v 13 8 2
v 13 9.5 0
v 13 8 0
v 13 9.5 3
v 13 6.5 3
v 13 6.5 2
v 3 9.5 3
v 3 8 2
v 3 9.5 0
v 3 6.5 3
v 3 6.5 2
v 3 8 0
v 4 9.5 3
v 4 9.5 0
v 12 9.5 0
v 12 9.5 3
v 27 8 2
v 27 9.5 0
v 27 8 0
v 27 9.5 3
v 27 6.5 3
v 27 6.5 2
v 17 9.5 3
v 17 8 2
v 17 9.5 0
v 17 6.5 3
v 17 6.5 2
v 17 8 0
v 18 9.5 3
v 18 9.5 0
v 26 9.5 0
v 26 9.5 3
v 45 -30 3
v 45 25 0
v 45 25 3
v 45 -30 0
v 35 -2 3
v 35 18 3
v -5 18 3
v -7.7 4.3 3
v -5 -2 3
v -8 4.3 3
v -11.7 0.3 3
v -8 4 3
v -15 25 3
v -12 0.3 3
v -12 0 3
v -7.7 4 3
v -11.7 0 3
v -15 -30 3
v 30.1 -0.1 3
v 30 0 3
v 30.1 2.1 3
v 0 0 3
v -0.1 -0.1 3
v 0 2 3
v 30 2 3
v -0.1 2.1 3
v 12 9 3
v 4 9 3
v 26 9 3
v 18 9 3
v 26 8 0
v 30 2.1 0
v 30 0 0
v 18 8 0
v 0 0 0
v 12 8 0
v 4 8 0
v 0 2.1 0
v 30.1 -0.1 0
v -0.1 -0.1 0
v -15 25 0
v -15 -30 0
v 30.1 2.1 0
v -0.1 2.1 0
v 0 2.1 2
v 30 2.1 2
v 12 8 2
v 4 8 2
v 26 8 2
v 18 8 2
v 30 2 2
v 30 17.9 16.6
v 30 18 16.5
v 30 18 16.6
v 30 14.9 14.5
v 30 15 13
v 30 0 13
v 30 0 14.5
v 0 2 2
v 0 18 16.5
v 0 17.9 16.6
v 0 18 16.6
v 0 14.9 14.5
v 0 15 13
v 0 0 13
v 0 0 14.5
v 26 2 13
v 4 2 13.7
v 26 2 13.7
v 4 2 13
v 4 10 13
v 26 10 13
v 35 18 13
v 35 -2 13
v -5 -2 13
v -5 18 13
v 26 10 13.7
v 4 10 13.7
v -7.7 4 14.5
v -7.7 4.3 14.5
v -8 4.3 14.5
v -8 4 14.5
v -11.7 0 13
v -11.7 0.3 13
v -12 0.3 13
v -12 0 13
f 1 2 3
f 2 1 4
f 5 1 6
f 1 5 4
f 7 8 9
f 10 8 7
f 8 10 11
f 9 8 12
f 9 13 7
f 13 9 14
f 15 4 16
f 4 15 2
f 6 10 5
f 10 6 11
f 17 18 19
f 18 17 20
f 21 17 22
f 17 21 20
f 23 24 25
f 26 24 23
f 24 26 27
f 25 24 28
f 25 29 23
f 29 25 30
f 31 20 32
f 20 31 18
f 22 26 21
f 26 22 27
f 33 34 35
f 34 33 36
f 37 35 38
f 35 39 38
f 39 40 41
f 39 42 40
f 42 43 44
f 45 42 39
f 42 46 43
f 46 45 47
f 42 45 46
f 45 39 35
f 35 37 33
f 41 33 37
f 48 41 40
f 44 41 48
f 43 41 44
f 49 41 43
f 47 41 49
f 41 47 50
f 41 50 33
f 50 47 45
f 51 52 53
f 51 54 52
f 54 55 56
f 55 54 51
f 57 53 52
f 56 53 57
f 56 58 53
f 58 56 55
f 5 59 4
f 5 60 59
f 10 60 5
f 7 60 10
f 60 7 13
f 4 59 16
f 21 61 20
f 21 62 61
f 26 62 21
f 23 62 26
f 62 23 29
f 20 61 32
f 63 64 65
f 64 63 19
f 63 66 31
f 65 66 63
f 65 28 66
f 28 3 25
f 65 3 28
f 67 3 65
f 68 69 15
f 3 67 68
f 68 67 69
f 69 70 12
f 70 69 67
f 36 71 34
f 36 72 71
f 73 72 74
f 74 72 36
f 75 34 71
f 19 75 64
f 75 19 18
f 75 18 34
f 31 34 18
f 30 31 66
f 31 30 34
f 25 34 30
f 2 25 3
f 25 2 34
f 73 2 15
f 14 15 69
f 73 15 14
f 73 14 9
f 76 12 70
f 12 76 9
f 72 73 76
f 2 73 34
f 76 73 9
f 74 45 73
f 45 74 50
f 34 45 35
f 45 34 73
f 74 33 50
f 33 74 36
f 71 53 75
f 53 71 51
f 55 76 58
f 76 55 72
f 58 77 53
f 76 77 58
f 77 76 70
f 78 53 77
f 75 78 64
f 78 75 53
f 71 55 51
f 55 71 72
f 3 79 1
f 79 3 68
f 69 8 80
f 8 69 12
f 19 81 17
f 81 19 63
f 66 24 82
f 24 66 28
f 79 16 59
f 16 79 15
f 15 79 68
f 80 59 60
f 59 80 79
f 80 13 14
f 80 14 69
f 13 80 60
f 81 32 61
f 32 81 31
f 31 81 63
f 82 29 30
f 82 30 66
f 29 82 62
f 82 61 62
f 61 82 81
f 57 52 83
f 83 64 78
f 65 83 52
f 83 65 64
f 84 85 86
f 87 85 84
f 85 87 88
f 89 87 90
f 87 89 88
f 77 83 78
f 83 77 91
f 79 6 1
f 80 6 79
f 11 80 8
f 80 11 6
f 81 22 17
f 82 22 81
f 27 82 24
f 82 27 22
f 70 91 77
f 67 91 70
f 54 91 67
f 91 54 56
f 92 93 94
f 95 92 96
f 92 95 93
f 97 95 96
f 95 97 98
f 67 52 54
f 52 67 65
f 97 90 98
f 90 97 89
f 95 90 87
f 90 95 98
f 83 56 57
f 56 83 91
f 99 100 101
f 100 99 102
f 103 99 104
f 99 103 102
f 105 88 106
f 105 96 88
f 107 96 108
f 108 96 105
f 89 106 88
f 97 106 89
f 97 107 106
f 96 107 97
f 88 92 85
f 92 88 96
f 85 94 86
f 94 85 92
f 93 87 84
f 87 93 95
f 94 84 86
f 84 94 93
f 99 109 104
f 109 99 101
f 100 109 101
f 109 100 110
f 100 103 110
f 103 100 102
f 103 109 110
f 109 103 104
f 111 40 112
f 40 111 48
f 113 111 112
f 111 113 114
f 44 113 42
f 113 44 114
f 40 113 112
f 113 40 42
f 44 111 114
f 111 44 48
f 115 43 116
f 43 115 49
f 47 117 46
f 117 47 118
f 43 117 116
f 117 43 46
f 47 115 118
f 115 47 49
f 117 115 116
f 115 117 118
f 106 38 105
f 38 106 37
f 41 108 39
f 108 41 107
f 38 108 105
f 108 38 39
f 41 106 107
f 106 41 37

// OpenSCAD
// ============================================================
// TESTE DE MONTAGEM — CLIP MANTA G3 + MDF + MANTA
// Abra no OpenSCAD → F5 (preview) → gire com mouse
// ============================================================
// MUDE 'vista' PARA TESTAR:
//   1 = Montado, 2 = Explodido, 3 = Corte, 4 = Animação
// ============================================================

vista = 1;        // [1:Montado, 2:Explodido, 3:Corte, 4:Animação]
explode = 15;

// === PARÂMETROS DO CLIP MANTA G3 ===
mdf = 3;
manta_esp = 10;
clip_larg = 30;
clip_parede = 2;
aba_comp = 15;
aba_esp = 1.5;
base_prof = 8;
dente_h = 1.2;
dente_w = 8;
dente_pos = 7;
slot_w = 10;
slot_prof = 2;

module clip_manta() {
    difference() {
        union() {
            // Base
            cube([clip_larg, base_prof, clip_parede]);
            // Parede
            cube([clip_larg, clip_parede, mdf + manta_esp + aba_esp]);
            // Aba
            translate([0, 0, mdf + manta_esp])
                cube([clip_larg, aba_comp, aba_esp]);
            // Rampa
            translate([0, aba_comp - 0.1, mdf + manta_esp])
                hull() {
                    cube([clip_larg, 0.1, aba_esp]);
                    translate([0, 3, aba_esp + 2])
                        cube([clip_larg, 0.1, 0.1]);
                }
            // Dentes
            for (dx = [clip_larg/2 - dente_pos - dente_w/2,
                       clip_larg/2 + dente_pos - dente_w/2])
                translate([dx, base_prof, 0]) {
                    hull() {
                        cube([dente_w, 0.1, clip_parede]);
                        translate([0, dente_h, 0])
                            cube([dente_w, 0.1, clip_parede + dente_h]);
                    }
                    translate([0, dente_h, 0])
                        cube([dente_w, 0.4, clip_parede + dente_h]);
                }
        }
        // Canal de flexão
        translate([clip_parede + 2, clip_parede, mdf + manta_esp - 0.1])
            cube([clip_larg - 2*clip_parede - 4, aba_comp - clip_parede - 5, 0.8]);
    }
}

module mdf_secao() {
    color("BurlyWood", 0.7)
    difference() {
        translate([-15, -30, 0])
            cube([clip_larg + 30, 55, mdf]);
        // Entalhe para parede do clip (30×2mm na borda do furo)
        translate([-0.1, -0.1, -0.1])
            cube([clip_larg + 0.2, clip_parede + 0.2, mdf + 0.2]);
        // Slots para dentes
        for (dx = [clip_larg/2 - dente_pos - slot_w/2,
                   clip_larg/2 + dente_pos - slot_w/2])
            translate([dx, base_prof - slot_prof + 0.5, -0.1])
                cube([slot_w, slot_prof + 1, mdf + 0.2]);
    }
}

module manta() {
    color("LimeGreen", 0.5)
    translate([-5, -2, mdf])
        cube([clip_larg + 10, aba_comp + 5, manta_esp]);
}

module cotas() {
    color("Red") {
        translate([-8, base_prof/2, 0])
            cube([0.3, 0.3, mdf + manta_esp + aba_esp]);
        translate([-12, 0, 0])
            cube([0.3, 0.3, mdf]);
        translate([-12, 0, mdf])
            cube([0.3, 0.3, manta_esp]);
    }
    color("White") {
        translate([-20, -5, mdf/2])
            rotate([90,0,0]) text("MDF 3mm", size=2);
        translate([-25, -5, mdf + manta_esp/2])
            rotate([90,0,0]) text("Manta 10mm", size=2);
        translate([-20, -5, mdf + manta_esp + aba_esp/2])
            rotate([90,0,0]) text("Aba 15mm", size=2);
    }
}

// === VISTAS ===
if (vista == 1) {
    echo("=== MANTA G3: VERIFICAR ===");
    echo("1. Aba de 15mm cobre a manta?");
    echo("2. Dentes encaixam nos slots?");
    echo("3. Manta comprimida entre aba e MDF?");
    mdf_secao(); manta();
    color("Orange") clip_manta();
    cotas();
}
if (vista == 2) {
    translate([0,0,-explode]) mdf_secao();
    manta();
    translate([0,0,explode]) color("Orange") clip_manta();
}
if (vista == 3) {
    difference() {
        union() { mdf_secao(); manta(); color("Orange") clip_manta(); }
        translate([clip_larg/2, -40, -10])
            cube([clip_larg+20, 100, 50]);
    }
    cotas();
}
if (vista == 4) {
    mdf_secao(); manta();
    color("Orange") translate([0,0,25*(1-$t)]) clip_manta();
}
